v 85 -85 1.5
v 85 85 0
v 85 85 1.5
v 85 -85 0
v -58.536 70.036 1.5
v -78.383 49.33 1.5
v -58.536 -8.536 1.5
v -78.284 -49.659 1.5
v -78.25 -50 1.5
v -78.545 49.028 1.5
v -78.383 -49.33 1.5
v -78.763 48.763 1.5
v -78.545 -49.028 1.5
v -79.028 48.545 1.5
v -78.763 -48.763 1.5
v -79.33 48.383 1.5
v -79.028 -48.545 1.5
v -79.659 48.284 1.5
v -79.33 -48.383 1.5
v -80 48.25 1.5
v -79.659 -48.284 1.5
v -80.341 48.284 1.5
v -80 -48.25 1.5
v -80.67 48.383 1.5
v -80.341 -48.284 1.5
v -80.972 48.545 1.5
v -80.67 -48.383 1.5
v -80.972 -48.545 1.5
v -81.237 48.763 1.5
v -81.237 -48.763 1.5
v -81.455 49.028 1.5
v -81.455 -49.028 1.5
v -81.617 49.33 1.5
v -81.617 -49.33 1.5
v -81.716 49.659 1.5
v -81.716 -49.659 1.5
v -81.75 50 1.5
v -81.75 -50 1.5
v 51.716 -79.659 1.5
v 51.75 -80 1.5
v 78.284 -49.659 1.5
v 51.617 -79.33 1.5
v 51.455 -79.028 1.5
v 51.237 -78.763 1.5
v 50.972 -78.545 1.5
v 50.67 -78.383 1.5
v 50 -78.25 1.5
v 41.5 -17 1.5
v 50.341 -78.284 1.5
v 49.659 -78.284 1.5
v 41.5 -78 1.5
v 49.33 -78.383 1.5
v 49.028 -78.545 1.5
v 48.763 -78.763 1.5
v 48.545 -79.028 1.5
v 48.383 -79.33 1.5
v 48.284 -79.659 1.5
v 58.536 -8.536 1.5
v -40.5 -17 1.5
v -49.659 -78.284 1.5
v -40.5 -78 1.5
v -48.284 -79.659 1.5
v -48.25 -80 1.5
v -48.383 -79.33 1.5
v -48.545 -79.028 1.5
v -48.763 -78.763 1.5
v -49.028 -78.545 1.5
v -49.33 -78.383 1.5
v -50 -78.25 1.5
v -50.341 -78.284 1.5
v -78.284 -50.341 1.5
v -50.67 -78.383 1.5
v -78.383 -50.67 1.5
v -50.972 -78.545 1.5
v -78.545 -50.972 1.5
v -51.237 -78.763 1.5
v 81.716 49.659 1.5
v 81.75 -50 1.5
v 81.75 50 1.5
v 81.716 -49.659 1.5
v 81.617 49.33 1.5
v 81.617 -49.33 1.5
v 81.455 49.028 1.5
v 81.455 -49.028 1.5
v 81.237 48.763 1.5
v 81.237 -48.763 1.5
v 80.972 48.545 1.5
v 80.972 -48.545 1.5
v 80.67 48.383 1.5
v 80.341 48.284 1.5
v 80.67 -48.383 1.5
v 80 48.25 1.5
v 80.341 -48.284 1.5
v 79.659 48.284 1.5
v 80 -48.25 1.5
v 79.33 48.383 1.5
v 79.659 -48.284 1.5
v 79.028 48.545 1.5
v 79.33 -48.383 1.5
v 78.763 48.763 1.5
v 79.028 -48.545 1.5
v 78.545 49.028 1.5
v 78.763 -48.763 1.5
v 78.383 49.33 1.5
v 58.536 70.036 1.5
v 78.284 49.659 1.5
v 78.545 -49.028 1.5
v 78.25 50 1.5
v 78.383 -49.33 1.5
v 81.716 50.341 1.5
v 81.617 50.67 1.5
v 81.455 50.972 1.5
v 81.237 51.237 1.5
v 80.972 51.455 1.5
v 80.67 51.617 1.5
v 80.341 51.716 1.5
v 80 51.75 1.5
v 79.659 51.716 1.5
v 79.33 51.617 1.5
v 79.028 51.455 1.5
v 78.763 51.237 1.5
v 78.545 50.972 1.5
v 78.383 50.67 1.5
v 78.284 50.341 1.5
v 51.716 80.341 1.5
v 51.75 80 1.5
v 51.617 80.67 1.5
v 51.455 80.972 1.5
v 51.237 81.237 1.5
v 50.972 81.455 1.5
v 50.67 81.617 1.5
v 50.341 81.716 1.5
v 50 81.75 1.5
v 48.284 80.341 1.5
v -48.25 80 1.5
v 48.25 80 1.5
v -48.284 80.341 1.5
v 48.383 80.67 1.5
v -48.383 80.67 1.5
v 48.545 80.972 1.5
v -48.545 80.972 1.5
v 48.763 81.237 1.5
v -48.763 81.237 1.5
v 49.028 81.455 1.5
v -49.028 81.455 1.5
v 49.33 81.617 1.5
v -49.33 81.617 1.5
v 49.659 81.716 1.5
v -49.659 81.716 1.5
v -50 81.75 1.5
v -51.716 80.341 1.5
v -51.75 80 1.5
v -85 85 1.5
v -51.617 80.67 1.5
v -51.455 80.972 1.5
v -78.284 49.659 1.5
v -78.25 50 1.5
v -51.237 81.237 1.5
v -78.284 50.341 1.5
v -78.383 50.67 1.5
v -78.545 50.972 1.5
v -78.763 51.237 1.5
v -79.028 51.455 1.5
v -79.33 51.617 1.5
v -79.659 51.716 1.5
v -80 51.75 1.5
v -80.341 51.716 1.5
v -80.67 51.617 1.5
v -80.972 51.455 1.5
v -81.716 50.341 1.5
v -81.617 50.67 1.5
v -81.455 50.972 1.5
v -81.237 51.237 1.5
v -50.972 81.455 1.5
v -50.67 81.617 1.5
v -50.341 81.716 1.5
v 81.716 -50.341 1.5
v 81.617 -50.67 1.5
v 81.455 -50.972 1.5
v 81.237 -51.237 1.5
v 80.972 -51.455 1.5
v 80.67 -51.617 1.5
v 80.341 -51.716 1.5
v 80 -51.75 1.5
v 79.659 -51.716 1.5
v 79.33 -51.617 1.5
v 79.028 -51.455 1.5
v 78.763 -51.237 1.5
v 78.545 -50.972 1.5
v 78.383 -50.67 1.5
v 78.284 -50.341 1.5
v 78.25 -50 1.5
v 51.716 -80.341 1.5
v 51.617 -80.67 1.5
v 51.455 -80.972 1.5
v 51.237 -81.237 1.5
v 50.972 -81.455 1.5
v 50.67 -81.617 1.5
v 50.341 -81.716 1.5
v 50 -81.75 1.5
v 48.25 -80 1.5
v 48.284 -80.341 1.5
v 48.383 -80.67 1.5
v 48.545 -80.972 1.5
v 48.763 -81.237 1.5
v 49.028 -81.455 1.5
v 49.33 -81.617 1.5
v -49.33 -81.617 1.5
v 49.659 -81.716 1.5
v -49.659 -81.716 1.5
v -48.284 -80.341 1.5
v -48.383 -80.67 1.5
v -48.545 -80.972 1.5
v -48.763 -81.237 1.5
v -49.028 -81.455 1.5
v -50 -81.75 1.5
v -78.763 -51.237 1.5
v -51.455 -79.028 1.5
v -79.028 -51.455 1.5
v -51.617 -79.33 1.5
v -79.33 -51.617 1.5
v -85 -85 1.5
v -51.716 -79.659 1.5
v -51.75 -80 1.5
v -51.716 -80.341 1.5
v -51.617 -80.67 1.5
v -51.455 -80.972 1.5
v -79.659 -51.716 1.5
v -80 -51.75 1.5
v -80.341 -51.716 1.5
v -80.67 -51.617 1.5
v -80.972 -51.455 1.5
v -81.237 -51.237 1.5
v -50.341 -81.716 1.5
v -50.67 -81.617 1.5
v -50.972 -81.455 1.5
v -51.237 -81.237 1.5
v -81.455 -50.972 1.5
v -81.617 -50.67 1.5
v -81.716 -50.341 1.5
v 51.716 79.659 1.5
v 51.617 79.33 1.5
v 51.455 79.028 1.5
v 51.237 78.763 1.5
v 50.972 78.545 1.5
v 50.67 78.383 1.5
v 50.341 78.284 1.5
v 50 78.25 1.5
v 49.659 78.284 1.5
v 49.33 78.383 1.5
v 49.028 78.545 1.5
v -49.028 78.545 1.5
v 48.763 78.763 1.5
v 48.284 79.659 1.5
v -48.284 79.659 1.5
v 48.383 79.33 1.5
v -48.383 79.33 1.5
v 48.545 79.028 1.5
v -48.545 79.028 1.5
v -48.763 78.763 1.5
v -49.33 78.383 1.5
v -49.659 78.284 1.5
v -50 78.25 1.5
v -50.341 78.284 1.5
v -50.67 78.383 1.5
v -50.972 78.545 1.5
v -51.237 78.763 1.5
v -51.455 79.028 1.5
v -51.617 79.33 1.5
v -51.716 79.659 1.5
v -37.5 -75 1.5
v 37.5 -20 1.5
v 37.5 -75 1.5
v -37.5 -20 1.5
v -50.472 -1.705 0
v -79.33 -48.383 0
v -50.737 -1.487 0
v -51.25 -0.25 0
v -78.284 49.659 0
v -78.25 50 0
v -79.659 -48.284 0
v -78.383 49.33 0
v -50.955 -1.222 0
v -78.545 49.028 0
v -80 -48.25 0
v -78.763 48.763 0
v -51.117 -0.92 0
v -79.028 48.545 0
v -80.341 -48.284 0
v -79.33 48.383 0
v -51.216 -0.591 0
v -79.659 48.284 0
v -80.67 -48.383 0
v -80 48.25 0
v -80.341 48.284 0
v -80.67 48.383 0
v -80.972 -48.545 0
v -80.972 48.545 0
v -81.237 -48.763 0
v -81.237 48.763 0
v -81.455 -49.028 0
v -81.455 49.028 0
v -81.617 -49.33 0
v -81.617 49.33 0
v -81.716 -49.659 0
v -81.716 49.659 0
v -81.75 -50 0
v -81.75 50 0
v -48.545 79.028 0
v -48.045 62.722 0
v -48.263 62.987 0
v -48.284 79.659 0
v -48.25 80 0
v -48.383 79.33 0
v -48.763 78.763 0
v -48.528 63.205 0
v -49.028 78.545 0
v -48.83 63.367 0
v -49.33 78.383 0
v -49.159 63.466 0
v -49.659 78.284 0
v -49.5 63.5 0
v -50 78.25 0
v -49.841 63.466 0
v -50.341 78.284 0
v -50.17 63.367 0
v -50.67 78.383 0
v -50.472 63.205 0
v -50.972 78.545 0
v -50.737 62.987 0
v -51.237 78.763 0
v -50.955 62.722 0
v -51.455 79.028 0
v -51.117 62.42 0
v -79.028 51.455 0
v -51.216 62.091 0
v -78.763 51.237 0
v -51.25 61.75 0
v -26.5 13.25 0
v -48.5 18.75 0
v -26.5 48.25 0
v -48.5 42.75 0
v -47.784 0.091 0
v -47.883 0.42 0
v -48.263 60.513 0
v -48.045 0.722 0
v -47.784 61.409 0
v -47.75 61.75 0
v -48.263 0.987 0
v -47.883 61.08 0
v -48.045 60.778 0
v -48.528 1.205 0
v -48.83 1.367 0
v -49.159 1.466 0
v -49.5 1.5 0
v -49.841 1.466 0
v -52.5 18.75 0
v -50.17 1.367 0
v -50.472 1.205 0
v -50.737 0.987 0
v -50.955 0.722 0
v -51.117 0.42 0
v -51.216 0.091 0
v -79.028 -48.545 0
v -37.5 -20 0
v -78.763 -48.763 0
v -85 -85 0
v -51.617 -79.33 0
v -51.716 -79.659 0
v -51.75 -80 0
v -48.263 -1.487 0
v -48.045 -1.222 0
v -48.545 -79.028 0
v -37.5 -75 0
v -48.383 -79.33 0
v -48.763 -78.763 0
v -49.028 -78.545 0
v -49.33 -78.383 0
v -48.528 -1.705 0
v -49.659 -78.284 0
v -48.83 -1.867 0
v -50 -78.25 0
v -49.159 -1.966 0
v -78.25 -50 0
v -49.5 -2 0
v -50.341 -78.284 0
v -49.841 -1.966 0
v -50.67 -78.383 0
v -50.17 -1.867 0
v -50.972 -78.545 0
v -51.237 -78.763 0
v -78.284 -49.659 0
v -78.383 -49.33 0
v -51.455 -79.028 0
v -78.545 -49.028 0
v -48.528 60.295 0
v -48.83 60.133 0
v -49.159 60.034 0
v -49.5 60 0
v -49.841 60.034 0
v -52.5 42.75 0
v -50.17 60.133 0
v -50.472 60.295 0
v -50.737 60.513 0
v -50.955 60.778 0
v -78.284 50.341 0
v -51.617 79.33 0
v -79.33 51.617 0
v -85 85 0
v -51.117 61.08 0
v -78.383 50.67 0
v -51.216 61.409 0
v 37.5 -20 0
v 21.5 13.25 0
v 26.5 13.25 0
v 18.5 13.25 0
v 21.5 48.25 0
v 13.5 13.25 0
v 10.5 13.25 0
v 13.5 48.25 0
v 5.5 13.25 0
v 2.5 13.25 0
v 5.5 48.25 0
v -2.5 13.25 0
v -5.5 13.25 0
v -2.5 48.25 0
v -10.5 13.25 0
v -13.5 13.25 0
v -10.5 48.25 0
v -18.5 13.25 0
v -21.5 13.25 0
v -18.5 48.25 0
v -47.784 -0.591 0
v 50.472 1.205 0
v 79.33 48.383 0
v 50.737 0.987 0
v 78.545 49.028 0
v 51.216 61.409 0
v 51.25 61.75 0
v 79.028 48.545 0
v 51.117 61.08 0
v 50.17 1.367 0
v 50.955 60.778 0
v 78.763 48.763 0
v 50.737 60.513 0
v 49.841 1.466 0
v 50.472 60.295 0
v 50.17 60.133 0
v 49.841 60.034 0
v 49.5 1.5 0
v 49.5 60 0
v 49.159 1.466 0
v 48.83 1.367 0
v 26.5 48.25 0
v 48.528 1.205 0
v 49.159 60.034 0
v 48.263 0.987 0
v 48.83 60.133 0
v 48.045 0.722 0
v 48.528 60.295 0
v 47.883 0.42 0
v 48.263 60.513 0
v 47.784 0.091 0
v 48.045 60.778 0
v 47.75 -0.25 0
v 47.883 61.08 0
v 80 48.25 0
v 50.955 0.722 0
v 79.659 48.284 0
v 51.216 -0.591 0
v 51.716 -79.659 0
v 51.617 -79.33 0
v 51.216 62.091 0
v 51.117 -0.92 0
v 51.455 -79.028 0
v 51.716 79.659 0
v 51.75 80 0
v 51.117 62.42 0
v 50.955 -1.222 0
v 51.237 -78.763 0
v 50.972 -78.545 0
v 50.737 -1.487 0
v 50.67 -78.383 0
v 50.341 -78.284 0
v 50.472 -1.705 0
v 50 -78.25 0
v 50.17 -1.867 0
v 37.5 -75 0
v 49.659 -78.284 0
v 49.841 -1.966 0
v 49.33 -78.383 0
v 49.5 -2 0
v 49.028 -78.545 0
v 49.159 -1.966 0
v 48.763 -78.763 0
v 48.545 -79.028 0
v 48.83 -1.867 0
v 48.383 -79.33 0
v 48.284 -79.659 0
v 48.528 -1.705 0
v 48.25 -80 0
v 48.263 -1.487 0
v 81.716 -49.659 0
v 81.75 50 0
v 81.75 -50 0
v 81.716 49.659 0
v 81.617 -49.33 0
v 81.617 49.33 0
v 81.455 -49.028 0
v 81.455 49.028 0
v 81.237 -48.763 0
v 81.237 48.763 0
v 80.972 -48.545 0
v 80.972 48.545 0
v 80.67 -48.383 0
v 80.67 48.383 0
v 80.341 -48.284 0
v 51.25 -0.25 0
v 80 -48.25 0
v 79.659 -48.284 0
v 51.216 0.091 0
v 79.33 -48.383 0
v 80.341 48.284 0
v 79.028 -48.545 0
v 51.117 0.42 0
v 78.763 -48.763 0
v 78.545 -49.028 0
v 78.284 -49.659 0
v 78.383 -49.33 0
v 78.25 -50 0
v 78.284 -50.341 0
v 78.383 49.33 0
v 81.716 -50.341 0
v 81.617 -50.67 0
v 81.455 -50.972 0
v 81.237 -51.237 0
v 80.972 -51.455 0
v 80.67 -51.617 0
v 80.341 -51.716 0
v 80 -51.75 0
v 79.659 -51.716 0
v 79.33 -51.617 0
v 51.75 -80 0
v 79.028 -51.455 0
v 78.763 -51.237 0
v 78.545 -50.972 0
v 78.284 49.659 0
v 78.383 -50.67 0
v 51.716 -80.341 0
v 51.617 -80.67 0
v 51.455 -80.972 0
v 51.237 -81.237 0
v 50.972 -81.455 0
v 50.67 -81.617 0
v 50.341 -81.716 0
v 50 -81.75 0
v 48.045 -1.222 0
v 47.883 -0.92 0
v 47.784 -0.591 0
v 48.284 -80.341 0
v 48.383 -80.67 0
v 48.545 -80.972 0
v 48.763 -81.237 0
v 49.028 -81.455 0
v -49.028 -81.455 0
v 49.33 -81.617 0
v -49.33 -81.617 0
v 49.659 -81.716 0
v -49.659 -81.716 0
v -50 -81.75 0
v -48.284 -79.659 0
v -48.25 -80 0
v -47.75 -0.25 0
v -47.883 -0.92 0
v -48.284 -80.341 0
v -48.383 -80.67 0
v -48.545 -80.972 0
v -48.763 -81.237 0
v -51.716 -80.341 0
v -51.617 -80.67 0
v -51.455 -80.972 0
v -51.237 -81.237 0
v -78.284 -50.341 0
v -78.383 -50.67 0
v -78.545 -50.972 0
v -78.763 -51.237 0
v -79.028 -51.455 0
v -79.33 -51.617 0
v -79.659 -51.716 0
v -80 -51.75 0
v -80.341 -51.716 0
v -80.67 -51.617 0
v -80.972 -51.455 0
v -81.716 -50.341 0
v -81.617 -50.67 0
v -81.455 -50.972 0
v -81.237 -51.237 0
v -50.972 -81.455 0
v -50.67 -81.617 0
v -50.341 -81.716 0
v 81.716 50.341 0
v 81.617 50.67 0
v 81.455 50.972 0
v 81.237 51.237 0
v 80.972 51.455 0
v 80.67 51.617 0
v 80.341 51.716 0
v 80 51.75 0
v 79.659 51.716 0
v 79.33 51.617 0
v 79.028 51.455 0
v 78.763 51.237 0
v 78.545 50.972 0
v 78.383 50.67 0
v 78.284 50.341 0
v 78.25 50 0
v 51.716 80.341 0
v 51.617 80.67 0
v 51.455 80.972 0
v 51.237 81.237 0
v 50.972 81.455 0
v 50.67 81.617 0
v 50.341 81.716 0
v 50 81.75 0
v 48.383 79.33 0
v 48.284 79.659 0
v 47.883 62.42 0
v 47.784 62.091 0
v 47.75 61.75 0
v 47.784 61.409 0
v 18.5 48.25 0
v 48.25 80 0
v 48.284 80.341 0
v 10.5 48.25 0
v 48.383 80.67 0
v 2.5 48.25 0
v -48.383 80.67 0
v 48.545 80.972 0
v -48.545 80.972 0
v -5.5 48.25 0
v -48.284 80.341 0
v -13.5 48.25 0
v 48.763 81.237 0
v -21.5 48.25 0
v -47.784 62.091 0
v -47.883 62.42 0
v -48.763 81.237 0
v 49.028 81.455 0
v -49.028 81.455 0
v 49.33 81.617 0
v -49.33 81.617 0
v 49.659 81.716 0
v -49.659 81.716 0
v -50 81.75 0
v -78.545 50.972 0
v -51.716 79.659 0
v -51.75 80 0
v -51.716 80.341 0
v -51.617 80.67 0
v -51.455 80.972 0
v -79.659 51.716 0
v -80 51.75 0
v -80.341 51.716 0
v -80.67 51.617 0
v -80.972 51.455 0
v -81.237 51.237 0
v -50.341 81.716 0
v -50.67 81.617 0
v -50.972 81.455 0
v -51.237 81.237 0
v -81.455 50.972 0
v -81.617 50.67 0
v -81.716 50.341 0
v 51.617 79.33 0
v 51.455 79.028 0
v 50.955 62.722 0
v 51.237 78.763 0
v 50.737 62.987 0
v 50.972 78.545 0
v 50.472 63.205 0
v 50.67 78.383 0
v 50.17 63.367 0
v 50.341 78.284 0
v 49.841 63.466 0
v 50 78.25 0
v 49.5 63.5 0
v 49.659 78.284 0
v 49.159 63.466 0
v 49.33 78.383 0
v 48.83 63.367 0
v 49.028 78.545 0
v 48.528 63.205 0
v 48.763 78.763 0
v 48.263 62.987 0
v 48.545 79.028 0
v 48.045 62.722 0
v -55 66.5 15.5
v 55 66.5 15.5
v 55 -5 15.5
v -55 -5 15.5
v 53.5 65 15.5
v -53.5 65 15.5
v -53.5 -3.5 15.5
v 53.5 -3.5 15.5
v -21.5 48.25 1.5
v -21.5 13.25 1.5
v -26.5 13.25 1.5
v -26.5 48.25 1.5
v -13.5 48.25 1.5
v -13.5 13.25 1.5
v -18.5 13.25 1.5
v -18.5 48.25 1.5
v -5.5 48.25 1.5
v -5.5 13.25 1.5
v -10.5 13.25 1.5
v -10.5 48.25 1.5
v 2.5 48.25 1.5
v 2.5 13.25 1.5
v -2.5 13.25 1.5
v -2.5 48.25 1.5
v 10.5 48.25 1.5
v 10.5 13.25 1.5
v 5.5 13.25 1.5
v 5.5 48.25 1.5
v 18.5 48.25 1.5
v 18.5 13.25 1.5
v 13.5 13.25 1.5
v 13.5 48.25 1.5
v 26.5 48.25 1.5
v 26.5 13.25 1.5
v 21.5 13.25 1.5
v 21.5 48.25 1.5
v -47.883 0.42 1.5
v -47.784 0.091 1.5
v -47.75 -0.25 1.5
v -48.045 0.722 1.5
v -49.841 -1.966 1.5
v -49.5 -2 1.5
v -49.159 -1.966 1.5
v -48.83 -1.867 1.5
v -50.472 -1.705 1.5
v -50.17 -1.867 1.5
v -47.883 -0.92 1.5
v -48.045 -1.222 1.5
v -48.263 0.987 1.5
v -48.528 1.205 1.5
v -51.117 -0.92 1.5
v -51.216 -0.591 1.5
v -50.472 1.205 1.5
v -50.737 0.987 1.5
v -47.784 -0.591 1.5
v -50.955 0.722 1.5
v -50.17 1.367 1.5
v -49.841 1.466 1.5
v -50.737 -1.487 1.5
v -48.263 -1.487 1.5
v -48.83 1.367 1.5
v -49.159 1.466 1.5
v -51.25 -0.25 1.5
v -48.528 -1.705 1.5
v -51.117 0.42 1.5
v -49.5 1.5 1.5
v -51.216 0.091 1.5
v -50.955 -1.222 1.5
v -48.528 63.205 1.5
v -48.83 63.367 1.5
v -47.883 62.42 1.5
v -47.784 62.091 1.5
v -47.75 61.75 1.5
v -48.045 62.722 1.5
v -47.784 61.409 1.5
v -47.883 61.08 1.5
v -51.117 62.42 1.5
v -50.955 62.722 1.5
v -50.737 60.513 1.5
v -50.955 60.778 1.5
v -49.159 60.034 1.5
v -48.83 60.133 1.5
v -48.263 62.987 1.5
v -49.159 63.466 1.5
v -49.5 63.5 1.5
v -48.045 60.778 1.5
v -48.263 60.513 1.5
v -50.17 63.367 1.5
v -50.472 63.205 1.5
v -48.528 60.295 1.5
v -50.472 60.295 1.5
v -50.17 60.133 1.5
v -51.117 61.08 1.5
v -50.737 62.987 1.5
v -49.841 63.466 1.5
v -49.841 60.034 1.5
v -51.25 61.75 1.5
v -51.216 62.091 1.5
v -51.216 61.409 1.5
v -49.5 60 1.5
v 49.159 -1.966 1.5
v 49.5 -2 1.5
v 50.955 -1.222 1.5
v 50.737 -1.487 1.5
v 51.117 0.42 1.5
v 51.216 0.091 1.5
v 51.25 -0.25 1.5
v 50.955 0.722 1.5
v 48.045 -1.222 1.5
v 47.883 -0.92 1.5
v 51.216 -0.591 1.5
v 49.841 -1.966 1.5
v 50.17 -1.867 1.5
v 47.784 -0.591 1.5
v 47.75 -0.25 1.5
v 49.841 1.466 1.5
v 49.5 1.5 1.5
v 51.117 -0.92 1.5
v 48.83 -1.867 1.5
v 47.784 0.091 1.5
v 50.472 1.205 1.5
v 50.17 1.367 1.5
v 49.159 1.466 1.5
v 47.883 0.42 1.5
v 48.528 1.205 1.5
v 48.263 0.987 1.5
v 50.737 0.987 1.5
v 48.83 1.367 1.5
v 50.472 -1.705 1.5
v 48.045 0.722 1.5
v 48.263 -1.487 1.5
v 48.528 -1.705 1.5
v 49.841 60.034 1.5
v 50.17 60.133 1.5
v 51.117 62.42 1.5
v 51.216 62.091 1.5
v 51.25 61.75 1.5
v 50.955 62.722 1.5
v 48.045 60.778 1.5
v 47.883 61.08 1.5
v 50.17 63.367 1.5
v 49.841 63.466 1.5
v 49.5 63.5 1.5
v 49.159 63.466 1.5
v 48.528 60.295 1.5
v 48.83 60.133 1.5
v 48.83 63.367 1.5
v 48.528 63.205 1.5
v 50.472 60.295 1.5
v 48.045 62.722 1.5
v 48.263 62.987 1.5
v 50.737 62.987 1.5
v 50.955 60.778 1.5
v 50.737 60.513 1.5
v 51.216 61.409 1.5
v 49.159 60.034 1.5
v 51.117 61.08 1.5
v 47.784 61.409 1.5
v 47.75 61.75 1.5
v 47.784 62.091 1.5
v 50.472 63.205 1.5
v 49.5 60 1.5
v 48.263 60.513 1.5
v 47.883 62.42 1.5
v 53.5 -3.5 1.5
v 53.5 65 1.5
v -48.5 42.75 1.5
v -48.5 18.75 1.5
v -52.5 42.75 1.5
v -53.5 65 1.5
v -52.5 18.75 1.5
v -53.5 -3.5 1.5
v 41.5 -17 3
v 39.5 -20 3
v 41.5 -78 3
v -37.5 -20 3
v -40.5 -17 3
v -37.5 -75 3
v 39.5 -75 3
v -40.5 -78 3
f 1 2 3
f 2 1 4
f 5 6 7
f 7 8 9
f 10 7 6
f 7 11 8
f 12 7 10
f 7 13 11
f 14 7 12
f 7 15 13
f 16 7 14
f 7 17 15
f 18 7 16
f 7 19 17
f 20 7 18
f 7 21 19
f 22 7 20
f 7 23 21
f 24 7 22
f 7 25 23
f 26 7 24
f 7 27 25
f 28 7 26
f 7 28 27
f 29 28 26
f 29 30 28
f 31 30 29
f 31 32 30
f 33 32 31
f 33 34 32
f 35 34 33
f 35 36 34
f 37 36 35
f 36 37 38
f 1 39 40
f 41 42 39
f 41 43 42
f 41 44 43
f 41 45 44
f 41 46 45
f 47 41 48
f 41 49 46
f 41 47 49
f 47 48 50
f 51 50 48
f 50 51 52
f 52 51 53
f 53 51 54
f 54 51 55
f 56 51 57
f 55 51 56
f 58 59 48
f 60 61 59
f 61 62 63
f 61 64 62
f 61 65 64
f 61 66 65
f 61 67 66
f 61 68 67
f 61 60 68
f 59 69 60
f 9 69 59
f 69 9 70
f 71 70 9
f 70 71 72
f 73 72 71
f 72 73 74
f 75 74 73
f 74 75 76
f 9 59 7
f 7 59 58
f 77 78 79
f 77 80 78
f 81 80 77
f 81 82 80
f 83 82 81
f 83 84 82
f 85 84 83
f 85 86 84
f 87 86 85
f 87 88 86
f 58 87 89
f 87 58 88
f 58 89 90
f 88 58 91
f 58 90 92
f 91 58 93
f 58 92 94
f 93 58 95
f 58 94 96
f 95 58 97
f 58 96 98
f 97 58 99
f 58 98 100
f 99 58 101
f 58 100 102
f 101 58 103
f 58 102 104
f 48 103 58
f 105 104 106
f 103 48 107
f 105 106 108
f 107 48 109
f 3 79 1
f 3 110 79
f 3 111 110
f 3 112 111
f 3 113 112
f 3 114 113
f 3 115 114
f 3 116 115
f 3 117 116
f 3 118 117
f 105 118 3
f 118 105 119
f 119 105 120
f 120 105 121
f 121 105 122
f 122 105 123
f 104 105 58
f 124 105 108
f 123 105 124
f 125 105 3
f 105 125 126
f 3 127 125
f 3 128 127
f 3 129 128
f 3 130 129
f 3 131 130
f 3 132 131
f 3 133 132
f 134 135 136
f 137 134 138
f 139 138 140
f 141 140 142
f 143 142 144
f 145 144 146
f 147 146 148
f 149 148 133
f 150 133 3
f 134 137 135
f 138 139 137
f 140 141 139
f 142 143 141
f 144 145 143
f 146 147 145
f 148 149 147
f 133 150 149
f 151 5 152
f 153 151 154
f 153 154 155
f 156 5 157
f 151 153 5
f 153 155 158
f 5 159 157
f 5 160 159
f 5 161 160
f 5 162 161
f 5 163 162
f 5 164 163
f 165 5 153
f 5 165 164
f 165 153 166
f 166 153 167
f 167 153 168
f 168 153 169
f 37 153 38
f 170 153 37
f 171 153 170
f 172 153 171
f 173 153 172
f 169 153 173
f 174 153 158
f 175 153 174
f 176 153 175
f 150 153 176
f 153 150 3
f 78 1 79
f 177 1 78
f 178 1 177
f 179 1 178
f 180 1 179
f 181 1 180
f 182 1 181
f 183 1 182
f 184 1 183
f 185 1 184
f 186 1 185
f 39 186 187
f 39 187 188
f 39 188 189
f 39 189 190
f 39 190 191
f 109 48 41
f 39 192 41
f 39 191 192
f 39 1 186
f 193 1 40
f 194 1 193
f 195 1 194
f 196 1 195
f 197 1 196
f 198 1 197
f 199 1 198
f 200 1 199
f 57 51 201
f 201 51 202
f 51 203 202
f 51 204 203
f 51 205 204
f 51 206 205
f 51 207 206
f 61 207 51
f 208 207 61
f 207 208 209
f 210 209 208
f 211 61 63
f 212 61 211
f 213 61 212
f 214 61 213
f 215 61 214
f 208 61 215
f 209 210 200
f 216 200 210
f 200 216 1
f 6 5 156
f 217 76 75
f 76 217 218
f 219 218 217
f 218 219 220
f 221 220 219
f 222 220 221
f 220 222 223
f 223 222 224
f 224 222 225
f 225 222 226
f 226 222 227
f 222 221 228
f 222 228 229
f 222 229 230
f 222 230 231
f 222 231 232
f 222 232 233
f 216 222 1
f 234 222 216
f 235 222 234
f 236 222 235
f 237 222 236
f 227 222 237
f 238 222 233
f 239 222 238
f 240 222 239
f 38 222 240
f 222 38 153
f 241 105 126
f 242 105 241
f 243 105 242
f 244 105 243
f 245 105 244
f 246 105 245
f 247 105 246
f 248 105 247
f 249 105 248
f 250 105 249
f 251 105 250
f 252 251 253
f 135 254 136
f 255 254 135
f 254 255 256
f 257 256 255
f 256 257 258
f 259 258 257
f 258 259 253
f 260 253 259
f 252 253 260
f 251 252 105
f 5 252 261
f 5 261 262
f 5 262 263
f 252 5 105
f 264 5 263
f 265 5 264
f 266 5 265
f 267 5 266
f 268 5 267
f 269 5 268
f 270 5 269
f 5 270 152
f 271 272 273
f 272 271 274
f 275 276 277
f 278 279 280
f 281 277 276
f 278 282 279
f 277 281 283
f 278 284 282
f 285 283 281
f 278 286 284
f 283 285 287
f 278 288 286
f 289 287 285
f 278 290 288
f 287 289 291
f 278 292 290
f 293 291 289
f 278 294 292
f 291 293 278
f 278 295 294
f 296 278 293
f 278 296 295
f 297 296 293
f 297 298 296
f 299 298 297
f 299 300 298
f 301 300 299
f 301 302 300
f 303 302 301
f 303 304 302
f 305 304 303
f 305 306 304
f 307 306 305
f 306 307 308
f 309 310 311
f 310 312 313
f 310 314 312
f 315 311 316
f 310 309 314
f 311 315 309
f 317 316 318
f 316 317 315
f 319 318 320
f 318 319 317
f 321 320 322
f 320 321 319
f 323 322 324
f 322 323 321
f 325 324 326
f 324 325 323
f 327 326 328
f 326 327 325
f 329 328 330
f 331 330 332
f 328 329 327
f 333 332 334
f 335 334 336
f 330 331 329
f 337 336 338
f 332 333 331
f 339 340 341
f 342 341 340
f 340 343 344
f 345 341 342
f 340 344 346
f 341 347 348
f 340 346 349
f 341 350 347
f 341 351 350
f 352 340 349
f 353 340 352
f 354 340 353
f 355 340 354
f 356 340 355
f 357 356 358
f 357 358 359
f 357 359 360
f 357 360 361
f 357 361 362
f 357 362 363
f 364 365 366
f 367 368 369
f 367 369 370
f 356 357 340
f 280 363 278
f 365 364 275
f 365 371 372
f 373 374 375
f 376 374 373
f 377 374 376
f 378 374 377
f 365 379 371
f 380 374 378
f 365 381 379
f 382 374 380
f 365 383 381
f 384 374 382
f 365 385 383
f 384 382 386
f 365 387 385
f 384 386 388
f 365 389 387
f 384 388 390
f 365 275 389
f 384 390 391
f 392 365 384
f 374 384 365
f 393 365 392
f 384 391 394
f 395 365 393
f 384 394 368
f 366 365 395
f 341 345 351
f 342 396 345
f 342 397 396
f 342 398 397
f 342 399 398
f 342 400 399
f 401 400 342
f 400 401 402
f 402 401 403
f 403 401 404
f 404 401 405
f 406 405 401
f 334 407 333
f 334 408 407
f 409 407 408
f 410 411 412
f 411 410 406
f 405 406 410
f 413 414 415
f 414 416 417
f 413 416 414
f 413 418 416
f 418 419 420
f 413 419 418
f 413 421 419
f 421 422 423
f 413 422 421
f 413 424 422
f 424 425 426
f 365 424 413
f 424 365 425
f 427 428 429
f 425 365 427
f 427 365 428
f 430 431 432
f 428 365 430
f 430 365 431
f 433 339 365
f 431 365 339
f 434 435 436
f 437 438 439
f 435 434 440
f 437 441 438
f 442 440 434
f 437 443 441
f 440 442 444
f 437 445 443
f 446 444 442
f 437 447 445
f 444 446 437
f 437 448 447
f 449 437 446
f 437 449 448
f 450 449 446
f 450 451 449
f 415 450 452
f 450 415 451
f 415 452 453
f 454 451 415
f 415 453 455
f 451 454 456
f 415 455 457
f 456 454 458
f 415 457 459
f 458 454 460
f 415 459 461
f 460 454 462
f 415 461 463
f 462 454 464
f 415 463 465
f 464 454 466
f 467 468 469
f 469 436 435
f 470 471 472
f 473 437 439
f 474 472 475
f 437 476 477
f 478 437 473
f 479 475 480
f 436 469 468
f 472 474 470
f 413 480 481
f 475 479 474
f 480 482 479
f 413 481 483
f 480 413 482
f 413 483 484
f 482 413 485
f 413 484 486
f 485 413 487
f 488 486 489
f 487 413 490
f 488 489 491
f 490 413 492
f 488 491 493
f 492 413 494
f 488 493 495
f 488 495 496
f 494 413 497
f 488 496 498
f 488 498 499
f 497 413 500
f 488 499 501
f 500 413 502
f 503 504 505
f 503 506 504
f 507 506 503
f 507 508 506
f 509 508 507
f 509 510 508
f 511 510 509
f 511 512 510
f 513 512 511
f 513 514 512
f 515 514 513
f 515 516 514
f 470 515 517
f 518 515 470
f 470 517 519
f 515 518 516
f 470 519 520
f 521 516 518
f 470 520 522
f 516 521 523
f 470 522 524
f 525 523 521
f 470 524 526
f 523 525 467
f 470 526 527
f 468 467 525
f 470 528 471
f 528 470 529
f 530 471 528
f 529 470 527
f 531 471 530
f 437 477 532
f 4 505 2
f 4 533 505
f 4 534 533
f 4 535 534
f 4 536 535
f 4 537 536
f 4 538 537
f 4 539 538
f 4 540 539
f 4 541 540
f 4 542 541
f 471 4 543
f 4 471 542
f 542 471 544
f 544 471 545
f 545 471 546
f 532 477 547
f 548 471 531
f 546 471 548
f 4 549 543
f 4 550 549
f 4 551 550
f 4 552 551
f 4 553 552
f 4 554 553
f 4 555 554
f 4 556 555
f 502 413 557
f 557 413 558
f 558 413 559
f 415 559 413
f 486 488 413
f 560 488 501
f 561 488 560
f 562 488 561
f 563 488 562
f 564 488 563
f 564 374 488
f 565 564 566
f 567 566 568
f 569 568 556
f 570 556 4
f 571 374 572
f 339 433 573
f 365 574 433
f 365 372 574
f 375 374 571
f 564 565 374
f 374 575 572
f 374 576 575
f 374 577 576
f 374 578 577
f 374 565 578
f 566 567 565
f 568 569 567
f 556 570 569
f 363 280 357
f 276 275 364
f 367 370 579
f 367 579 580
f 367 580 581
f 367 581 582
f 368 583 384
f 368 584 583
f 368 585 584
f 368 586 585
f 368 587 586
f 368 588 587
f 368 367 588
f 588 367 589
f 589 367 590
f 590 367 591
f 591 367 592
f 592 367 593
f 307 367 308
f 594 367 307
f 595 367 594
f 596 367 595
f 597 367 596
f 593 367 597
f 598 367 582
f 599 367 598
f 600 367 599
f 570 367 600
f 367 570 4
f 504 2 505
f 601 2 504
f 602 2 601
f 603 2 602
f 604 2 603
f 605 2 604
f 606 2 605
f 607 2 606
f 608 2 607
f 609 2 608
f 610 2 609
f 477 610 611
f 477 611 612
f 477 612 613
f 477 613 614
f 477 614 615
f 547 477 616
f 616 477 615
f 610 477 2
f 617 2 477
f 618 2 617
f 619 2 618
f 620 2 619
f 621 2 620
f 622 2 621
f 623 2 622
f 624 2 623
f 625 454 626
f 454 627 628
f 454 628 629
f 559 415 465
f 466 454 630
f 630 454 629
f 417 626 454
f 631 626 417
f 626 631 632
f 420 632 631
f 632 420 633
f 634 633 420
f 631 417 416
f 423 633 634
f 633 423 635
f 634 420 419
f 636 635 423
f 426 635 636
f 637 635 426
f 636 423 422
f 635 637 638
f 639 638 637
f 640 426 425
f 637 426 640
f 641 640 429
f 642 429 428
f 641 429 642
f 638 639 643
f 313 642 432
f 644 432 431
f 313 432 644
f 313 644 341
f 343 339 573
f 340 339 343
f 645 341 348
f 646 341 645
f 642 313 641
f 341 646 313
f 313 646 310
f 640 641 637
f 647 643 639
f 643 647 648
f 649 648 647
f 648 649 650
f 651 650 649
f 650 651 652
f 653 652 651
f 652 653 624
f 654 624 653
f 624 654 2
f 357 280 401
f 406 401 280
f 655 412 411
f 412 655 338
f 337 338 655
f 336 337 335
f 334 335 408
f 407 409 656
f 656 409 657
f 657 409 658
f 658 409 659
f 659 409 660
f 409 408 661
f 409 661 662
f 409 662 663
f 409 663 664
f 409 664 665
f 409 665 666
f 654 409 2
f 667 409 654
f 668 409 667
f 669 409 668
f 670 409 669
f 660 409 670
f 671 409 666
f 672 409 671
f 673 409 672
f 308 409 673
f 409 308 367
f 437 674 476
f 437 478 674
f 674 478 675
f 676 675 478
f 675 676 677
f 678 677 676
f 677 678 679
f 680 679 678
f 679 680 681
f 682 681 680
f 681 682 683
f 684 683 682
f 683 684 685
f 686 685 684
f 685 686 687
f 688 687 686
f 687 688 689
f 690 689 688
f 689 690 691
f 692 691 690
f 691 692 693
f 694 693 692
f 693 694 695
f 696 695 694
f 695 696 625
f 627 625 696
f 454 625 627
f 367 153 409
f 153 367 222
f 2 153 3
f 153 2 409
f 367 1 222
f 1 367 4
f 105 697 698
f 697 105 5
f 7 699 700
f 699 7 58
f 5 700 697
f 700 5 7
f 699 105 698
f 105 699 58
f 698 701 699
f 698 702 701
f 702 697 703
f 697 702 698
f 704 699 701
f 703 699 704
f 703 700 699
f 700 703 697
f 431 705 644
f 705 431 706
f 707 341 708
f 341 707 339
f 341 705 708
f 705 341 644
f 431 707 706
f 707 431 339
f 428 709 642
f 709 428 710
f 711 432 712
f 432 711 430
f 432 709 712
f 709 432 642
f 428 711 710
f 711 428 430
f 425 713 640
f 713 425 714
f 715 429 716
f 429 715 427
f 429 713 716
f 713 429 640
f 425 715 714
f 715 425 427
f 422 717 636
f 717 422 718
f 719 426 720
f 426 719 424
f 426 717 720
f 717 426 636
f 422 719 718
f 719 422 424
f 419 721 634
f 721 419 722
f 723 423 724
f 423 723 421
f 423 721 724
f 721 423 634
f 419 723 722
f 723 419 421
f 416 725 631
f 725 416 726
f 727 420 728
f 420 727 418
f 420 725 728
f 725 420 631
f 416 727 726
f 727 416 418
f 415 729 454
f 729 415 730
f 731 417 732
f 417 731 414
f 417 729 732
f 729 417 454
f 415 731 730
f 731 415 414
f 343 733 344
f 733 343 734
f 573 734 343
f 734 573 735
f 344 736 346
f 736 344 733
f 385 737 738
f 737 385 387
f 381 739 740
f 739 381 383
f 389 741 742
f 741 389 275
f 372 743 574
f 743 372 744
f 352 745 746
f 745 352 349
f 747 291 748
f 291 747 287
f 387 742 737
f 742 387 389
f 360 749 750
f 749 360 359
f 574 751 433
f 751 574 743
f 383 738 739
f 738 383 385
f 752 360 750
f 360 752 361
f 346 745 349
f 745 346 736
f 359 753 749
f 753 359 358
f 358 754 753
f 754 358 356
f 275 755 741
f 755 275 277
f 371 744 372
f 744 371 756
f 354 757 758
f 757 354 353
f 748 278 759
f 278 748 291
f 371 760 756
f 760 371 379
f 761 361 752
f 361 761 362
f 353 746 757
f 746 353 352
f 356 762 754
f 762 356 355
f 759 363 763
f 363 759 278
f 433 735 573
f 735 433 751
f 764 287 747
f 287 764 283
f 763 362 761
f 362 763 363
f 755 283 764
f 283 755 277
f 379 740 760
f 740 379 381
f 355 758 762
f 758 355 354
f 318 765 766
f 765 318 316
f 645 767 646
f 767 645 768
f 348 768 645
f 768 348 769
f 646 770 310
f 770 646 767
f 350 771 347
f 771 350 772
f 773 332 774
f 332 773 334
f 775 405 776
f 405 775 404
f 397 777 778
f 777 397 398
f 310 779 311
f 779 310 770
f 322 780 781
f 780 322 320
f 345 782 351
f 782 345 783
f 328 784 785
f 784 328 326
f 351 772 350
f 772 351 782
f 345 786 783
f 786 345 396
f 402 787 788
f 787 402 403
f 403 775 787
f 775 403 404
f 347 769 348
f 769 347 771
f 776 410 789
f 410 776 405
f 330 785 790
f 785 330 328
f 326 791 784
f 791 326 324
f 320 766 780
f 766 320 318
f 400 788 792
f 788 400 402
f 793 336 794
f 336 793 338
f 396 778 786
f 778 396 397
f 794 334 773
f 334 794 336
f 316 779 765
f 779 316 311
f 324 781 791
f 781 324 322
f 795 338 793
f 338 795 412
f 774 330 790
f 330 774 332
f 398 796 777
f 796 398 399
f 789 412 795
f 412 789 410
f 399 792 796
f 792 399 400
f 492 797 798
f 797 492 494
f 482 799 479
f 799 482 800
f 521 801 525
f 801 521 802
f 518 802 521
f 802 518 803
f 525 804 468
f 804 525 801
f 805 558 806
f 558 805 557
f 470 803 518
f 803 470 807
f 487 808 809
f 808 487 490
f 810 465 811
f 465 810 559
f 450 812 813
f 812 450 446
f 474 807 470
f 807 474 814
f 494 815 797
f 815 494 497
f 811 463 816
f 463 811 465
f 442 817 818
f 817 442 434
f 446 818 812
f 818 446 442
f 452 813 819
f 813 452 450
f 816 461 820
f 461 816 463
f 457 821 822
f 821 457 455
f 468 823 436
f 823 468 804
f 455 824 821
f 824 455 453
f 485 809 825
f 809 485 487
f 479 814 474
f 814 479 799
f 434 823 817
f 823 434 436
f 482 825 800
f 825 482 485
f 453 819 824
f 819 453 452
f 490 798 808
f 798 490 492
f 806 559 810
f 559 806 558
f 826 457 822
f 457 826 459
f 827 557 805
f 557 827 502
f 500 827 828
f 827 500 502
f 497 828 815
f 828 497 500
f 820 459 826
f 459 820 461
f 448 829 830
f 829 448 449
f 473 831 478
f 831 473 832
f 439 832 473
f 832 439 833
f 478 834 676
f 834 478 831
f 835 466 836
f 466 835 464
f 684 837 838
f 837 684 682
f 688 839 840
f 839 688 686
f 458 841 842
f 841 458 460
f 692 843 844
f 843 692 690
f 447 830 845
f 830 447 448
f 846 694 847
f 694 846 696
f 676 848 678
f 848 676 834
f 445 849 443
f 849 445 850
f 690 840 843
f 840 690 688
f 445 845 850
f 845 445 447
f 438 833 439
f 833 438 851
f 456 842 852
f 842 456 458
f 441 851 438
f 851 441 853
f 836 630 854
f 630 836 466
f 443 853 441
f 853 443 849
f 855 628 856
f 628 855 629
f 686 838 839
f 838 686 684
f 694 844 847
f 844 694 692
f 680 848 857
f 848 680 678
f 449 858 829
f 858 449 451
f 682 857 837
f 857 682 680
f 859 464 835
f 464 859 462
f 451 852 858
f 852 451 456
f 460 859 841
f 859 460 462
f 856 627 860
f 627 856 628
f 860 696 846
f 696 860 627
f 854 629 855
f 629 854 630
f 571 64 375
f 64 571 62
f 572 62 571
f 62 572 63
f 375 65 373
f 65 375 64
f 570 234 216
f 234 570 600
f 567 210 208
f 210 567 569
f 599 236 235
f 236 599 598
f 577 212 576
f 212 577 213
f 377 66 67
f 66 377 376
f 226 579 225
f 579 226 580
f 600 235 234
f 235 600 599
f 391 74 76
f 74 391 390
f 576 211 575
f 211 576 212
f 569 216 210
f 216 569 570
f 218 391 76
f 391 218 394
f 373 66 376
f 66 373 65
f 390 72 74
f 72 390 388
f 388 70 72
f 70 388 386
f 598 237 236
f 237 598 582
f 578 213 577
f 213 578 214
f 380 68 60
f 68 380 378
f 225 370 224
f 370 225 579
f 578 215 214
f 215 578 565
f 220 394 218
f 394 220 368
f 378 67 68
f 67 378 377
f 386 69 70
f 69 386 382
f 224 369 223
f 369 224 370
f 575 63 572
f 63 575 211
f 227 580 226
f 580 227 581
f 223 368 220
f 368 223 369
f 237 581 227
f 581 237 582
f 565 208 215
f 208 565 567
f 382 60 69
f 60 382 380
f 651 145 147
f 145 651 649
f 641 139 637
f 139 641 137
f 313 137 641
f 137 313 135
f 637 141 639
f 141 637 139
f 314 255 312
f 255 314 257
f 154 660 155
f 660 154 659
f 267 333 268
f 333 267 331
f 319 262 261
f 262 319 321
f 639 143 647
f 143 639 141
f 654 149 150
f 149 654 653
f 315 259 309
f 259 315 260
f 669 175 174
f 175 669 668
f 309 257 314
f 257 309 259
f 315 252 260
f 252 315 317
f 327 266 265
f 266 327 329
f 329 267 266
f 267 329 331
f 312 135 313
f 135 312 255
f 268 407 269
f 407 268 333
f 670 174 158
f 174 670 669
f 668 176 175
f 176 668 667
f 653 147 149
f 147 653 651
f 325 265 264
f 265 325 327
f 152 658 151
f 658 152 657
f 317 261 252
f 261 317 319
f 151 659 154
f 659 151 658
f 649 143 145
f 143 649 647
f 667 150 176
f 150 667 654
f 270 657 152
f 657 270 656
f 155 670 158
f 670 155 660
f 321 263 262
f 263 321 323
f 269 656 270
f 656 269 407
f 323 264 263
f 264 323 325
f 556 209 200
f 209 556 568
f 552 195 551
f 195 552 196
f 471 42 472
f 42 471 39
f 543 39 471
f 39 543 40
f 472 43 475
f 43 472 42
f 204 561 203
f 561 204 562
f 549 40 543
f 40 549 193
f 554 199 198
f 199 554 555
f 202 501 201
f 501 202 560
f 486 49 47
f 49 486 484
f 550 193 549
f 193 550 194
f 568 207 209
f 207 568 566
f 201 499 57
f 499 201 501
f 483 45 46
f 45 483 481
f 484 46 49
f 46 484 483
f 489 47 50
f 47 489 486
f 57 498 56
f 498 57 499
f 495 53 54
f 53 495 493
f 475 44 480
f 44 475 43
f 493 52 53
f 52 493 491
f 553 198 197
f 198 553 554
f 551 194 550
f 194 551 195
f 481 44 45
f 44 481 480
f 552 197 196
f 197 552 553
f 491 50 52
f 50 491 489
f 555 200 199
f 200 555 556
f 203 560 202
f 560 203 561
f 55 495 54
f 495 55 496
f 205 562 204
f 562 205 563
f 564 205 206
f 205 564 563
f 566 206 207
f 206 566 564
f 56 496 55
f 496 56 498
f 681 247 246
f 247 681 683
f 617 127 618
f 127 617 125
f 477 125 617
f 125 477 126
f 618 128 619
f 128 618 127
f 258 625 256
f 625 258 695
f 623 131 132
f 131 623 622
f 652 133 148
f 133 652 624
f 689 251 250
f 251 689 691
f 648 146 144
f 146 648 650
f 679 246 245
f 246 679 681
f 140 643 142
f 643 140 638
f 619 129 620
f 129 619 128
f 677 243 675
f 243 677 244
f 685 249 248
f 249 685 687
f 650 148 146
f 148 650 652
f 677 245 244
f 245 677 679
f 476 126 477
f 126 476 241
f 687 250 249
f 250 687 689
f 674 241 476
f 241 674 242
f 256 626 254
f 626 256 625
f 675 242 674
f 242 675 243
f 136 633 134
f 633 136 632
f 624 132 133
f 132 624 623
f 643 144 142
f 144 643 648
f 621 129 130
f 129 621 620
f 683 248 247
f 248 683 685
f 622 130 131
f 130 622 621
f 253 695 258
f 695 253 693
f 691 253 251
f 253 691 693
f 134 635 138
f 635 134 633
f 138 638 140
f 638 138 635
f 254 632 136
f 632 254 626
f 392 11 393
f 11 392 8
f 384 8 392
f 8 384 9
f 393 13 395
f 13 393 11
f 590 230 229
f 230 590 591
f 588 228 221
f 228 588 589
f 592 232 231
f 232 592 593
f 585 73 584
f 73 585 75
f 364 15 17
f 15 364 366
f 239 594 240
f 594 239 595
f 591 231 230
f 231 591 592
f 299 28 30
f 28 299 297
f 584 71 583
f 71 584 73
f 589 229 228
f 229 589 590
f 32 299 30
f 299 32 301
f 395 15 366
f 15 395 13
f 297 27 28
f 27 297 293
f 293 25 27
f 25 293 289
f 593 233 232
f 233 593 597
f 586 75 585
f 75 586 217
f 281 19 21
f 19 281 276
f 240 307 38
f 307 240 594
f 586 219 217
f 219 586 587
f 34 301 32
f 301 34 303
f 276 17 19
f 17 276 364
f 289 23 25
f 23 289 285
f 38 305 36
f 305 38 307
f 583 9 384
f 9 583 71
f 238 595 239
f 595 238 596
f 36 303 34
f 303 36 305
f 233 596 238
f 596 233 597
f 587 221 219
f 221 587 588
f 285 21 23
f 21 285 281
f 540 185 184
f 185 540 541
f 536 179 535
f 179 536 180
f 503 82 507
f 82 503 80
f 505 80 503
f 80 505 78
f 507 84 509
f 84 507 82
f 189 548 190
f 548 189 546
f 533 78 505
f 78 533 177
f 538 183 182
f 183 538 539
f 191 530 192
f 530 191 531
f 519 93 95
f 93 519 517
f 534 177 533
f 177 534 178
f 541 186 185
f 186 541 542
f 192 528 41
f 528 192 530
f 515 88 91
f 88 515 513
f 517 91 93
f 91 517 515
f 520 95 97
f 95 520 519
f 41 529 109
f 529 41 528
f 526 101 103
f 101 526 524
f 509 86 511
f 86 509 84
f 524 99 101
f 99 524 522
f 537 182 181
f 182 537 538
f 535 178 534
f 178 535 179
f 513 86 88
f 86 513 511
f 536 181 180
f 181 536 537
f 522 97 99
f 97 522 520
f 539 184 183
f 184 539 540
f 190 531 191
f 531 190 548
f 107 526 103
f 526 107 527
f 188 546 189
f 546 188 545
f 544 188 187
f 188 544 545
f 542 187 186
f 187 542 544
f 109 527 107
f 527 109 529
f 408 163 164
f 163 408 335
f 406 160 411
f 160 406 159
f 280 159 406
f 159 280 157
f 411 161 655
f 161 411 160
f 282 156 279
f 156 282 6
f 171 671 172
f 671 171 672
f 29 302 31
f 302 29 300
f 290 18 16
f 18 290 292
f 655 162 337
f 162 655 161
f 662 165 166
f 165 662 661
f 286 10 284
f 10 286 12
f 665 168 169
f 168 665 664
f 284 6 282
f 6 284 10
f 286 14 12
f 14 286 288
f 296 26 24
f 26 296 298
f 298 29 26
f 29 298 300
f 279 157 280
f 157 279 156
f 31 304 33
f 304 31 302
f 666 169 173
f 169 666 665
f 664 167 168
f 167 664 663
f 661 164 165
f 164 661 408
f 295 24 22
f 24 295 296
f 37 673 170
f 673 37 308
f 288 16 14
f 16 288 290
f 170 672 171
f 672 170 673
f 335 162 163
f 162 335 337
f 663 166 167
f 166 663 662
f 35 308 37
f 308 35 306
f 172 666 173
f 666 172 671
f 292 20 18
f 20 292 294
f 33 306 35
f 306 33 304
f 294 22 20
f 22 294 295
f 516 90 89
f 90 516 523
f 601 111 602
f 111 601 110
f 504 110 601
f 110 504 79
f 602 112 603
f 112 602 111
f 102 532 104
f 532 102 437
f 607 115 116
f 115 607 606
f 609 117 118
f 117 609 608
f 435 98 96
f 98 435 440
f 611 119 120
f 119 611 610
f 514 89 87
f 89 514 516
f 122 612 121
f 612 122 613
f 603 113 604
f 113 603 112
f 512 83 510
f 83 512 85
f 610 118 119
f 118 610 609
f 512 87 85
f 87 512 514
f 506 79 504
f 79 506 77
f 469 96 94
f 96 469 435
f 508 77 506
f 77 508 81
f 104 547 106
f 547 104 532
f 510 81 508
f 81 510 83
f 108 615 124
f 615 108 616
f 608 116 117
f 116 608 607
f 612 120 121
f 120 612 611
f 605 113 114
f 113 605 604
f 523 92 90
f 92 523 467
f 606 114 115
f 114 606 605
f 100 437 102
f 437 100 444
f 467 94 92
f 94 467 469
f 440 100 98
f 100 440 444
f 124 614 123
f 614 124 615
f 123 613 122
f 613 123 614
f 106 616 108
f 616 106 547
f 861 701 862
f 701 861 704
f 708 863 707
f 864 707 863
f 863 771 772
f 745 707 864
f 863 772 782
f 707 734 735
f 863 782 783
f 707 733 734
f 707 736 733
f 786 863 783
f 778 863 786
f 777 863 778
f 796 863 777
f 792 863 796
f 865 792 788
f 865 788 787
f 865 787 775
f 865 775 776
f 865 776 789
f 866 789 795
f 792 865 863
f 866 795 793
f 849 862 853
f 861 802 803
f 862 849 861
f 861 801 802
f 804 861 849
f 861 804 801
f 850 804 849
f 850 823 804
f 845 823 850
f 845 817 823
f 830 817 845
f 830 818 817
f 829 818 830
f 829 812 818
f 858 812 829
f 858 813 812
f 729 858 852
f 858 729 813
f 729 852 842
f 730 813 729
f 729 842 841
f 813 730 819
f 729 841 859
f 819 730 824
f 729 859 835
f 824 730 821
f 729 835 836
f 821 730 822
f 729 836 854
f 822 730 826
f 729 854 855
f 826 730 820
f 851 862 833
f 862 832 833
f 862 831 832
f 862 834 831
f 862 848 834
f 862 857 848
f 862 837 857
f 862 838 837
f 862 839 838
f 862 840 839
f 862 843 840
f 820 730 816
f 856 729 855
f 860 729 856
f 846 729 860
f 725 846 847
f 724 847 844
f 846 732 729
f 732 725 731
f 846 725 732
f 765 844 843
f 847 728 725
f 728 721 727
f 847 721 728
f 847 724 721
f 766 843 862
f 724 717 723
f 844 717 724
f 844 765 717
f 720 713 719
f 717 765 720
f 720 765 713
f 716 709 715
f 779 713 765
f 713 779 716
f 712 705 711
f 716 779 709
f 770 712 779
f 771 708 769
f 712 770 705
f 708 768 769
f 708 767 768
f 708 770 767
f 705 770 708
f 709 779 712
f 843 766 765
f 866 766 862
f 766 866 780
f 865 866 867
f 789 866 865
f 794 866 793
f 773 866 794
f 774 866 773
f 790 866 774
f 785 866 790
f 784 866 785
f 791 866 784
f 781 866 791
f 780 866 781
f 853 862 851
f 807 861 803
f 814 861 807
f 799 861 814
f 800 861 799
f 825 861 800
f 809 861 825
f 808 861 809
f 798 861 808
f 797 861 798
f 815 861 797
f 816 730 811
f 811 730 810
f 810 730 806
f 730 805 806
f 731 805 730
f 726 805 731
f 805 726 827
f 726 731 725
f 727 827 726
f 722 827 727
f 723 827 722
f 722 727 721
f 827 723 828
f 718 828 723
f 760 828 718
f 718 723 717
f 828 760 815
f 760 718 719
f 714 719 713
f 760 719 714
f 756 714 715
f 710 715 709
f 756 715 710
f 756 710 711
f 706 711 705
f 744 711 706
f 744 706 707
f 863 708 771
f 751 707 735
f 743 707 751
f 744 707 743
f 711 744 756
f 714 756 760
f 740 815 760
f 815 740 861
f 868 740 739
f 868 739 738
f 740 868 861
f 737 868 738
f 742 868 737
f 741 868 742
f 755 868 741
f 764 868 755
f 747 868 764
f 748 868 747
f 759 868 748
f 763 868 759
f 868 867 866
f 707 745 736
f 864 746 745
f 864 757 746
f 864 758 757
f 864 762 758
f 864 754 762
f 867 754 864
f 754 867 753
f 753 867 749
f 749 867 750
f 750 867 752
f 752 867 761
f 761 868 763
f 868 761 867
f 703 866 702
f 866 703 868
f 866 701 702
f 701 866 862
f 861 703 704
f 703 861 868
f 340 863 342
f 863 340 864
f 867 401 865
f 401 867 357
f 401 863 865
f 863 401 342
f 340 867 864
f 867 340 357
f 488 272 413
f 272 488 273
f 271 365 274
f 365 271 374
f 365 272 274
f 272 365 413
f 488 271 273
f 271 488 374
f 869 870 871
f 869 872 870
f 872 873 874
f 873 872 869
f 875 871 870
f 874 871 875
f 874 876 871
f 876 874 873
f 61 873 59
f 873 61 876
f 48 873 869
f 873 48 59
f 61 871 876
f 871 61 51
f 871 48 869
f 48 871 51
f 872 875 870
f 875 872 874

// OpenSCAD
L=170;
W=86;
T=1.5;
ML=150;
MW=66;
MH=23;

DL=107;
DW=68.5;
DH=14;

BW=75;
BH=55;

difference() {
    union() {
        cube_center([L,L,T]);
        translate([0,L/2-DW/2-20,T])
        minkowski() {
            cube_center([DL+2*T,DW+2*T,0.0001]);
            rotate([0,0,45])
            cylinder($fn=4,h=DH,d1=10,d2=0.0001);
        }
    }
    
    translate([0,L/2-DW/2-20,T])
    minkowski() {
        cube_center([DL,DW,DH+2]);
    }
    
    translate([0,L/2-DW/2-20,0])
    translate([-DL/2+2+1,0,0])
    cube_center([4,24,10]);
    
    translate([0,L/2-DW/2-20,0])
    for(s=[-24:8:24]) translate([s,0,0])
    cube_center([5,35,10]);
    
    translate([0,L/2-DW/2-20,0])
    for(s=[-1,1]) for(t=[-1,1])
    translate([s*(99/2),t*(62/2),0])
    cylinder(d=3.5,$fn=32,h=10);
    
    for(s=[-1,1]) for(t=[-1,1])
    translate([s*(L/2-35),t*(L/2-5),0])
    cylinder(d=3.5,$fn=32,h=10);
    
    for(s=[-1,1]) for(t=[-1,1])
    translate([t*(L/2-5),s*(L/2-35),0])
    cylinder(d=3.5,$fn=32,h=10);
    
    translate([0,-L/2+BH/2+10,0])
    cube_center([BW,BH,10]);
}


    translate([0,-L/2+BH/2+10,0]) {
        difference() {
            translate([0,0,T])
            cube_center([BW+4*T,BH+4*T,T]);
            cube_center([BW,BH,10]);
            
            translate([BW/2+6,0,0])
            cube_center([10,BH+10,10]);
            
            translate([3,0,T])
            minkowski() {
                cube_center([BW+6,BH,0.0001]);
                rotate([0,0,45])
                cylinder($fn=4,h=T,d1=2*T,d2=0.0001);
            }
        }
    }
    


    translate([1,-L/2+BH/2+10,T]) {
        
            translate([BW/2+T,0,0])
            cube_center([2*T,BH+4*T,T]);
            minkowski() {
                cube_center([BW+2,BH,0.0001]);
                rotate([0,0,45])
                cylinder($fn=4,h=T,d1=2*T,d2=0.0001);
            }
    }

module cube_center(dims,r=0) {
    if(r==0) {
        translate([-dims[0]/2, -dims[1]/2, 0])
        cube(dims);
    } else {
        
        minkowski() {
            translate([-dims[0]/2+r, -dims[1]/2+r, 0])
            cube([dims[0]-2*r,dims[1]-2*r,dims[2]]);
            cylinder(r=r,h=0.00001,$fn=32);
        }
    }
}
